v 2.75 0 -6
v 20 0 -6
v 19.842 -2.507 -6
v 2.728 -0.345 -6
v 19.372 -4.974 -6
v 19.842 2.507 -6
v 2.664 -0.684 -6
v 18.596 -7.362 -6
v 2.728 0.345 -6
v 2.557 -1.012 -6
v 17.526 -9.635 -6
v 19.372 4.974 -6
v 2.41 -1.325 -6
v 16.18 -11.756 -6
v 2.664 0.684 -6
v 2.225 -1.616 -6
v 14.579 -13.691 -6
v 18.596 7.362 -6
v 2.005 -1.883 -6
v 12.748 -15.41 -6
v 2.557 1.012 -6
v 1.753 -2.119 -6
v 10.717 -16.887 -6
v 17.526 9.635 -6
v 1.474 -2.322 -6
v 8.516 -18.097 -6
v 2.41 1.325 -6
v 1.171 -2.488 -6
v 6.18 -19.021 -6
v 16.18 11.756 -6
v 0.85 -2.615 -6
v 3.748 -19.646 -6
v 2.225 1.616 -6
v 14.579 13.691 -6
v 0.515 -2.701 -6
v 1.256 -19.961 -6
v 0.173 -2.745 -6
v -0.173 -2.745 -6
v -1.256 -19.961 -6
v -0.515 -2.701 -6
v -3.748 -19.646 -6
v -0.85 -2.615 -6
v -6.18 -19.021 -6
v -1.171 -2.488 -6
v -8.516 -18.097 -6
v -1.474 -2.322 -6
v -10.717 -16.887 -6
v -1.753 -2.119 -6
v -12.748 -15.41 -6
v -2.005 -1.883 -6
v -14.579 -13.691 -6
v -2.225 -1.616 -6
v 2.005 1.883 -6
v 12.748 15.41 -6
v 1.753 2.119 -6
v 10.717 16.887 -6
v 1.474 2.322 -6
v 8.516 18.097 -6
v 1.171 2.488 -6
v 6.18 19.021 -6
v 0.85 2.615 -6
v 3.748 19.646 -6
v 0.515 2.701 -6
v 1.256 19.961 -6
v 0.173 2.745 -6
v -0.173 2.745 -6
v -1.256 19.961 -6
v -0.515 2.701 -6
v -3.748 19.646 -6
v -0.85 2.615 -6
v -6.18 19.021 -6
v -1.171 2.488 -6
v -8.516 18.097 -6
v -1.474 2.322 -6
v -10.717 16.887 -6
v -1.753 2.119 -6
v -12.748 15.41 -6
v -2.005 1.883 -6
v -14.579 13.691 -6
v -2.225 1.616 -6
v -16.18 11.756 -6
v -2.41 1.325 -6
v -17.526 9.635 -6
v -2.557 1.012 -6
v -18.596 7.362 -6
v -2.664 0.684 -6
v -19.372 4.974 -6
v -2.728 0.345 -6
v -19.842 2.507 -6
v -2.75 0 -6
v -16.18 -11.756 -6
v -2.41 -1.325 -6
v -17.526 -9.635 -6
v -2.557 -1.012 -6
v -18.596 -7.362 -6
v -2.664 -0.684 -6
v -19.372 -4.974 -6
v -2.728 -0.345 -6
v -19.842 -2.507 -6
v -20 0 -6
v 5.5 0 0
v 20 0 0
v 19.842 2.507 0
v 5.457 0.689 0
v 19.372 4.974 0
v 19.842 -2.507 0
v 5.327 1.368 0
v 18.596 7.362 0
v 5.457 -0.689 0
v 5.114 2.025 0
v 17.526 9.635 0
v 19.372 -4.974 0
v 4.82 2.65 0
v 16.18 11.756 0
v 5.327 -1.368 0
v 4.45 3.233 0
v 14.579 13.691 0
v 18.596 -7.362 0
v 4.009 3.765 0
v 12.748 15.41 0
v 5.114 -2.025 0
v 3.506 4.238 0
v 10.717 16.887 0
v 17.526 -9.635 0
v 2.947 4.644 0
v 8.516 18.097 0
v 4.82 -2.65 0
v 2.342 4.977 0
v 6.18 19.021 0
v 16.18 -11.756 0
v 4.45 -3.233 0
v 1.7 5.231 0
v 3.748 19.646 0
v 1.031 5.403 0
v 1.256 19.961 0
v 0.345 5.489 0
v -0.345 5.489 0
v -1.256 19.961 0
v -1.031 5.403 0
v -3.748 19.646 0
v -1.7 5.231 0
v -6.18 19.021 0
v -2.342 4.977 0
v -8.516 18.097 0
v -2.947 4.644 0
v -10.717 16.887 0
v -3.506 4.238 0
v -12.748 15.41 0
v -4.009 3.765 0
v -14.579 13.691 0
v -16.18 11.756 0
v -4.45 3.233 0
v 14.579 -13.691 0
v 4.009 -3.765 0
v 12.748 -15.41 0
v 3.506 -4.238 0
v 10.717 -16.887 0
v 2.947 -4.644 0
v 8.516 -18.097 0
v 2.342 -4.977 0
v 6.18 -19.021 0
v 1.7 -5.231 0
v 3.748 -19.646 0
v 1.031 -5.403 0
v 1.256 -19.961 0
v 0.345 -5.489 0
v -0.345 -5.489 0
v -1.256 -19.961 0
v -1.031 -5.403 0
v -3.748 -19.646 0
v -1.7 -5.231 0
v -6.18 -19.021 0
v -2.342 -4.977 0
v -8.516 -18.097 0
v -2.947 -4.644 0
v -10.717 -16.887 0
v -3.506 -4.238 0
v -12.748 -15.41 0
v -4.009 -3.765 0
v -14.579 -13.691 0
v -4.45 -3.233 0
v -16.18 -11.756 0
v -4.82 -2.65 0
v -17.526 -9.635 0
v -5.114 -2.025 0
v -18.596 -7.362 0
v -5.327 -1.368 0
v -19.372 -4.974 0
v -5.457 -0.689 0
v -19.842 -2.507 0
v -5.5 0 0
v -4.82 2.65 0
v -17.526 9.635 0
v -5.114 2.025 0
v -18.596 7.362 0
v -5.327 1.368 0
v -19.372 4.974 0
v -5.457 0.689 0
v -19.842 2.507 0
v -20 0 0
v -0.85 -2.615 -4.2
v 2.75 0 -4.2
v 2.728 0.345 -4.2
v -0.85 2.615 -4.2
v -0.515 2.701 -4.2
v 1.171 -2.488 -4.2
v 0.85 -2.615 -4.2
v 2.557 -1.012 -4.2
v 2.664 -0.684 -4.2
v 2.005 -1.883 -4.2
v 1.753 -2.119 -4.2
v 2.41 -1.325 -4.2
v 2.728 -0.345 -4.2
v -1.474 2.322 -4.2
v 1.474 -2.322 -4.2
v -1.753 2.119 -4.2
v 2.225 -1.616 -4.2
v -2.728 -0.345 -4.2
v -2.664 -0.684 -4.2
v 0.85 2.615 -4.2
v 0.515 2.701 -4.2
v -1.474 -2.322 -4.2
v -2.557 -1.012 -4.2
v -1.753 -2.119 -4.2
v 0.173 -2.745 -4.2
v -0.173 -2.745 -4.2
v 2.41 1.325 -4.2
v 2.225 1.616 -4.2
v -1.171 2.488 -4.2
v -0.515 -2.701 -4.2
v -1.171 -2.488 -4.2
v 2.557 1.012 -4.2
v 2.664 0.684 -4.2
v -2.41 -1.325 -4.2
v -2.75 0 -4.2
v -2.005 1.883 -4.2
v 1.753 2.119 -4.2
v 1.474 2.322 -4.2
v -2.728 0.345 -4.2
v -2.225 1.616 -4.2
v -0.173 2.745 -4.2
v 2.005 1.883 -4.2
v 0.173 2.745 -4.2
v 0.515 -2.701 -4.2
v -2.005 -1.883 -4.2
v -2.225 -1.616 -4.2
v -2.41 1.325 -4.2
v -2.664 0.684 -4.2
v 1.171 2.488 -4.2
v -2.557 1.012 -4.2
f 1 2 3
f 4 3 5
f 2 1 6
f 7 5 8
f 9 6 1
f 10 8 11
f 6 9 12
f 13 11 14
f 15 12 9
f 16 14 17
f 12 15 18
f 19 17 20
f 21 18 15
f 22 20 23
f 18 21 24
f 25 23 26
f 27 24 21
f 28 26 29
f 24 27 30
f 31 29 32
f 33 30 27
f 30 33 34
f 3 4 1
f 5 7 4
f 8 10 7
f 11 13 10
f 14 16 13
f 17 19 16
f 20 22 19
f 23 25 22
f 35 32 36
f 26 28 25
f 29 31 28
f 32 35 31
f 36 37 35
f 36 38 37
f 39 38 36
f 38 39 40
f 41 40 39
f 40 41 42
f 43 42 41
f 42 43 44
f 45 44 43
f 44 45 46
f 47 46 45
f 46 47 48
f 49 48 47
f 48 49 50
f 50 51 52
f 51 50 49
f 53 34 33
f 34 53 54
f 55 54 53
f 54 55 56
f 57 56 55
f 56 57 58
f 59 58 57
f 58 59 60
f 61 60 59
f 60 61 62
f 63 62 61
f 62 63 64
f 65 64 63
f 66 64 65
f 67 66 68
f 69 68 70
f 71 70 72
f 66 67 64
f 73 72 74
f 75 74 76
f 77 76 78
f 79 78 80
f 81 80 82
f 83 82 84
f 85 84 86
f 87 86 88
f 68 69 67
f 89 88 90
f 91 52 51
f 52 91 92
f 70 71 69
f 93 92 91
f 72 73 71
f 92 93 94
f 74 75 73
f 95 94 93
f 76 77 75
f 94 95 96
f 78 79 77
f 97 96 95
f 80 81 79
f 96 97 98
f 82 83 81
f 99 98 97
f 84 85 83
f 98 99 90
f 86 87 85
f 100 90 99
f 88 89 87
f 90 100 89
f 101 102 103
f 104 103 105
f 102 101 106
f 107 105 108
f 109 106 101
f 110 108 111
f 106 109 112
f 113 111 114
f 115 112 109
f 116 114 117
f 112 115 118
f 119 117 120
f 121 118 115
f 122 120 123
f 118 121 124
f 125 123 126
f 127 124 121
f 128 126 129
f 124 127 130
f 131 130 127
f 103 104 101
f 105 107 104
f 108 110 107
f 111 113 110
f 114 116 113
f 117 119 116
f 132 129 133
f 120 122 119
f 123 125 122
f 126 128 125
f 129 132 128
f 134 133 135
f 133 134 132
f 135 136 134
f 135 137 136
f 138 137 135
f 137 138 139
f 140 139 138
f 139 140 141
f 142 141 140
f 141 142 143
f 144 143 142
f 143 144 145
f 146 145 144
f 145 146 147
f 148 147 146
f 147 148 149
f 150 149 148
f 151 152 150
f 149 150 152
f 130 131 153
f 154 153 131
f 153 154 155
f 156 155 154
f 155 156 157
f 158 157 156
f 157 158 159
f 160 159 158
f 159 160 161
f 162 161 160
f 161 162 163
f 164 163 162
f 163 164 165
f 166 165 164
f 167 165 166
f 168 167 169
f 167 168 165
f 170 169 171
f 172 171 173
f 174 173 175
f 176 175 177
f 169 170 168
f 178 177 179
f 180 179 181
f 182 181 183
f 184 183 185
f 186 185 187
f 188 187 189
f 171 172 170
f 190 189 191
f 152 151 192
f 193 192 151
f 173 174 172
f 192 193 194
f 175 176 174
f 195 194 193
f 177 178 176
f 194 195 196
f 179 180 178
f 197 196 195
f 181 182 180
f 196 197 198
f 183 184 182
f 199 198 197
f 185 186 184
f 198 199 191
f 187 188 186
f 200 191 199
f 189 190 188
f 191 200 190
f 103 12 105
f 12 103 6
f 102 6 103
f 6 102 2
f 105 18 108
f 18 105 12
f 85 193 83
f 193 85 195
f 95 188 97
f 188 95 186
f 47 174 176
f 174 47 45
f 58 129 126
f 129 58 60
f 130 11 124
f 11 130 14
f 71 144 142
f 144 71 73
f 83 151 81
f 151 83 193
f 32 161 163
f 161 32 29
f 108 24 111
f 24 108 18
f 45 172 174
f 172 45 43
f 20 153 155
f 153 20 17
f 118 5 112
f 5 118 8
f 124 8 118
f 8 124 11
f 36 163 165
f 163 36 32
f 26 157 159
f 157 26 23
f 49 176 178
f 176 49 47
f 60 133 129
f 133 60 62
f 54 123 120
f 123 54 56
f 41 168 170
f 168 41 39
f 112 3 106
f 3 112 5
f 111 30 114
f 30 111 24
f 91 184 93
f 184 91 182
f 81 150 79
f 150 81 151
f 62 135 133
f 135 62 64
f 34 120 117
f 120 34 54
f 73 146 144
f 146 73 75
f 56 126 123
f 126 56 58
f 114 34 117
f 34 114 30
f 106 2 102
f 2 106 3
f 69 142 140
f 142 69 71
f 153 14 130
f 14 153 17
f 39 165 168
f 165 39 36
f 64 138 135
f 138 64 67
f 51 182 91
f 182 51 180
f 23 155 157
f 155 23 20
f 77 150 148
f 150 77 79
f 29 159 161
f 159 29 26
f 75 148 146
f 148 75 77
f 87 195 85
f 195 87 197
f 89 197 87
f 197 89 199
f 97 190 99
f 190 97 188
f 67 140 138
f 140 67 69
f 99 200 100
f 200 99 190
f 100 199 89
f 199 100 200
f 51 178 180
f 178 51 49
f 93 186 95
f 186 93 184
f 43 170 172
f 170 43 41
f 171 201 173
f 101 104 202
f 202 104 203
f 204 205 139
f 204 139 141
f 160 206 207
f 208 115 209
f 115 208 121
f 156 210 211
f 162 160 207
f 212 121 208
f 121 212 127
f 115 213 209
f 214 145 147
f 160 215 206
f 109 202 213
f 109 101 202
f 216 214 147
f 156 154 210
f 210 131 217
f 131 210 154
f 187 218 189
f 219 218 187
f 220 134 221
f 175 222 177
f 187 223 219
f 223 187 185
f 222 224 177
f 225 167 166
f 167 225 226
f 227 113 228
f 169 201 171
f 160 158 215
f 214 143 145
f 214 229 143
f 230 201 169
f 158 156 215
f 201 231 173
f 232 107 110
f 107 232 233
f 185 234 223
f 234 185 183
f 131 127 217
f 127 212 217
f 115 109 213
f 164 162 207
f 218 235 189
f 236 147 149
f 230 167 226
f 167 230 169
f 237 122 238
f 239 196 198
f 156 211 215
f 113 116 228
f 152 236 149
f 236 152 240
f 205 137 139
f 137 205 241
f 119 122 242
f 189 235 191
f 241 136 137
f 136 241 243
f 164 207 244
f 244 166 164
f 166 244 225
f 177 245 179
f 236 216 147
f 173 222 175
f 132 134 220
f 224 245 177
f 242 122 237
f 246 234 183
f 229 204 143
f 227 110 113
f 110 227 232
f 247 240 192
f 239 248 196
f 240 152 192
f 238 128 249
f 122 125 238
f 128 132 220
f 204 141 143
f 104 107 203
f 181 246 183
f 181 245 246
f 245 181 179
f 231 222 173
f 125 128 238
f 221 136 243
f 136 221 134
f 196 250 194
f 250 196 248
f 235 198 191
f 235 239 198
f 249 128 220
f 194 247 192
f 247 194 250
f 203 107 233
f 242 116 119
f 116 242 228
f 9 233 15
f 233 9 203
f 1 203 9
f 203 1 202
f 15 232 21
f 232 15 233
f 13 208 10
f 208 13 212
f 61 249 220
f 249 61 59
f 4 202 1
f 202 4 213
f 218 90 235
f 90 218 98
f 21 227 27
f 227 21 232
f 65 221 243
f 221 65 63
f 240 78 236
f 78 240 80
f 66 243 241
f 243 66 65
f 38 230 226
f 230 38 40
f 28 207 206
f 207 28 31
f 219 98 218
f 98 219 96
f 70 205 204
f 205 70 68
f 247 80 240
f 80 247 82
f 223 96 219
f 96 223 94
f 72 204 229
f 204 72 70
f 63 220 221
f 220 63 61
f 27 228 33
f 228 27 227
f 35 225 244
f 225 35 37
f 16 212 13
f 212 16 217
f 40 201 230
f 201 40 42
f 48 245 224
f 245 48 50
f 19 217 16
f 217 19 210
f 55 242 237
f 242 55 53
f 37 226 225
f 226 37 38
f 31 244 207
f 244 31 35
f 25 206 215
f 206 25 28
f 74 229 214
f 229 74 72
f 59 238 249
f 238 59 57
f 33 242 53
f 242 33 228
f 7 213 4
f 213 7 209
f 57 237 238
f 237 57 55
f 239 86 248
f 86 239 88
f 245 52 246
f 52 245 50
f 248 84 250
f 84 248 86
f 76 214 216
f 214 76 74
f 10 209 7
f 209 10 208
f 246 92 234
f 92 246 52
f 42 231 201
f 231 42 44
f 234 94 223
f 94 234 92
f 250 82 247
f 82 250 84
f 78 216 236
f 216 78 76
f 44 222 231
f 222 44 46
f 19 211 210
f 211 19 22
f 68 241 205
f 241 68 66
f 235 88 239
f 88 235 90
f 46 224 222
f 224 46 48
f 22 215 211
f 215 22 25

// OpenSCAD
$fn = 50;


difference() {
	union() {
		translate(v = [0, 0, -6.0000000000]) {
			cylinder(h = 6, r = 10.0000000000);
		}
		translate(v = [0, 0, -6.0000000000]) {
			cylinder(h = 6, r = 20.0000000000);
		}
	}
	union() {
		translate(v = [0, 0, 0]) {
			rotate(a = [0, 0, 0]) {
				difference() {
					union() {
						#translate(v = [0, 0, -6.0000000000]) {
							cylinder(h = 6, r = 2.2500000000);
						}
						#translate(v = [0, 0, -4.2000000000]) {
							cylinder(h = 4.2000000000, r = 10.0000000000, r1 = 2.7500000000, r2 = 5.5000000000);
						}
						#translate(v = [0, 0, -6.0000000000]) {
							cylinder(h = 6, r = 2.7500000000);
						}
						#translate(v = [0, 0, -6.0000000000]) {
							cylinder(h = 6, r = 2.2500000000);
						}
					}
					union();
				}
			}
		}
	}
}
